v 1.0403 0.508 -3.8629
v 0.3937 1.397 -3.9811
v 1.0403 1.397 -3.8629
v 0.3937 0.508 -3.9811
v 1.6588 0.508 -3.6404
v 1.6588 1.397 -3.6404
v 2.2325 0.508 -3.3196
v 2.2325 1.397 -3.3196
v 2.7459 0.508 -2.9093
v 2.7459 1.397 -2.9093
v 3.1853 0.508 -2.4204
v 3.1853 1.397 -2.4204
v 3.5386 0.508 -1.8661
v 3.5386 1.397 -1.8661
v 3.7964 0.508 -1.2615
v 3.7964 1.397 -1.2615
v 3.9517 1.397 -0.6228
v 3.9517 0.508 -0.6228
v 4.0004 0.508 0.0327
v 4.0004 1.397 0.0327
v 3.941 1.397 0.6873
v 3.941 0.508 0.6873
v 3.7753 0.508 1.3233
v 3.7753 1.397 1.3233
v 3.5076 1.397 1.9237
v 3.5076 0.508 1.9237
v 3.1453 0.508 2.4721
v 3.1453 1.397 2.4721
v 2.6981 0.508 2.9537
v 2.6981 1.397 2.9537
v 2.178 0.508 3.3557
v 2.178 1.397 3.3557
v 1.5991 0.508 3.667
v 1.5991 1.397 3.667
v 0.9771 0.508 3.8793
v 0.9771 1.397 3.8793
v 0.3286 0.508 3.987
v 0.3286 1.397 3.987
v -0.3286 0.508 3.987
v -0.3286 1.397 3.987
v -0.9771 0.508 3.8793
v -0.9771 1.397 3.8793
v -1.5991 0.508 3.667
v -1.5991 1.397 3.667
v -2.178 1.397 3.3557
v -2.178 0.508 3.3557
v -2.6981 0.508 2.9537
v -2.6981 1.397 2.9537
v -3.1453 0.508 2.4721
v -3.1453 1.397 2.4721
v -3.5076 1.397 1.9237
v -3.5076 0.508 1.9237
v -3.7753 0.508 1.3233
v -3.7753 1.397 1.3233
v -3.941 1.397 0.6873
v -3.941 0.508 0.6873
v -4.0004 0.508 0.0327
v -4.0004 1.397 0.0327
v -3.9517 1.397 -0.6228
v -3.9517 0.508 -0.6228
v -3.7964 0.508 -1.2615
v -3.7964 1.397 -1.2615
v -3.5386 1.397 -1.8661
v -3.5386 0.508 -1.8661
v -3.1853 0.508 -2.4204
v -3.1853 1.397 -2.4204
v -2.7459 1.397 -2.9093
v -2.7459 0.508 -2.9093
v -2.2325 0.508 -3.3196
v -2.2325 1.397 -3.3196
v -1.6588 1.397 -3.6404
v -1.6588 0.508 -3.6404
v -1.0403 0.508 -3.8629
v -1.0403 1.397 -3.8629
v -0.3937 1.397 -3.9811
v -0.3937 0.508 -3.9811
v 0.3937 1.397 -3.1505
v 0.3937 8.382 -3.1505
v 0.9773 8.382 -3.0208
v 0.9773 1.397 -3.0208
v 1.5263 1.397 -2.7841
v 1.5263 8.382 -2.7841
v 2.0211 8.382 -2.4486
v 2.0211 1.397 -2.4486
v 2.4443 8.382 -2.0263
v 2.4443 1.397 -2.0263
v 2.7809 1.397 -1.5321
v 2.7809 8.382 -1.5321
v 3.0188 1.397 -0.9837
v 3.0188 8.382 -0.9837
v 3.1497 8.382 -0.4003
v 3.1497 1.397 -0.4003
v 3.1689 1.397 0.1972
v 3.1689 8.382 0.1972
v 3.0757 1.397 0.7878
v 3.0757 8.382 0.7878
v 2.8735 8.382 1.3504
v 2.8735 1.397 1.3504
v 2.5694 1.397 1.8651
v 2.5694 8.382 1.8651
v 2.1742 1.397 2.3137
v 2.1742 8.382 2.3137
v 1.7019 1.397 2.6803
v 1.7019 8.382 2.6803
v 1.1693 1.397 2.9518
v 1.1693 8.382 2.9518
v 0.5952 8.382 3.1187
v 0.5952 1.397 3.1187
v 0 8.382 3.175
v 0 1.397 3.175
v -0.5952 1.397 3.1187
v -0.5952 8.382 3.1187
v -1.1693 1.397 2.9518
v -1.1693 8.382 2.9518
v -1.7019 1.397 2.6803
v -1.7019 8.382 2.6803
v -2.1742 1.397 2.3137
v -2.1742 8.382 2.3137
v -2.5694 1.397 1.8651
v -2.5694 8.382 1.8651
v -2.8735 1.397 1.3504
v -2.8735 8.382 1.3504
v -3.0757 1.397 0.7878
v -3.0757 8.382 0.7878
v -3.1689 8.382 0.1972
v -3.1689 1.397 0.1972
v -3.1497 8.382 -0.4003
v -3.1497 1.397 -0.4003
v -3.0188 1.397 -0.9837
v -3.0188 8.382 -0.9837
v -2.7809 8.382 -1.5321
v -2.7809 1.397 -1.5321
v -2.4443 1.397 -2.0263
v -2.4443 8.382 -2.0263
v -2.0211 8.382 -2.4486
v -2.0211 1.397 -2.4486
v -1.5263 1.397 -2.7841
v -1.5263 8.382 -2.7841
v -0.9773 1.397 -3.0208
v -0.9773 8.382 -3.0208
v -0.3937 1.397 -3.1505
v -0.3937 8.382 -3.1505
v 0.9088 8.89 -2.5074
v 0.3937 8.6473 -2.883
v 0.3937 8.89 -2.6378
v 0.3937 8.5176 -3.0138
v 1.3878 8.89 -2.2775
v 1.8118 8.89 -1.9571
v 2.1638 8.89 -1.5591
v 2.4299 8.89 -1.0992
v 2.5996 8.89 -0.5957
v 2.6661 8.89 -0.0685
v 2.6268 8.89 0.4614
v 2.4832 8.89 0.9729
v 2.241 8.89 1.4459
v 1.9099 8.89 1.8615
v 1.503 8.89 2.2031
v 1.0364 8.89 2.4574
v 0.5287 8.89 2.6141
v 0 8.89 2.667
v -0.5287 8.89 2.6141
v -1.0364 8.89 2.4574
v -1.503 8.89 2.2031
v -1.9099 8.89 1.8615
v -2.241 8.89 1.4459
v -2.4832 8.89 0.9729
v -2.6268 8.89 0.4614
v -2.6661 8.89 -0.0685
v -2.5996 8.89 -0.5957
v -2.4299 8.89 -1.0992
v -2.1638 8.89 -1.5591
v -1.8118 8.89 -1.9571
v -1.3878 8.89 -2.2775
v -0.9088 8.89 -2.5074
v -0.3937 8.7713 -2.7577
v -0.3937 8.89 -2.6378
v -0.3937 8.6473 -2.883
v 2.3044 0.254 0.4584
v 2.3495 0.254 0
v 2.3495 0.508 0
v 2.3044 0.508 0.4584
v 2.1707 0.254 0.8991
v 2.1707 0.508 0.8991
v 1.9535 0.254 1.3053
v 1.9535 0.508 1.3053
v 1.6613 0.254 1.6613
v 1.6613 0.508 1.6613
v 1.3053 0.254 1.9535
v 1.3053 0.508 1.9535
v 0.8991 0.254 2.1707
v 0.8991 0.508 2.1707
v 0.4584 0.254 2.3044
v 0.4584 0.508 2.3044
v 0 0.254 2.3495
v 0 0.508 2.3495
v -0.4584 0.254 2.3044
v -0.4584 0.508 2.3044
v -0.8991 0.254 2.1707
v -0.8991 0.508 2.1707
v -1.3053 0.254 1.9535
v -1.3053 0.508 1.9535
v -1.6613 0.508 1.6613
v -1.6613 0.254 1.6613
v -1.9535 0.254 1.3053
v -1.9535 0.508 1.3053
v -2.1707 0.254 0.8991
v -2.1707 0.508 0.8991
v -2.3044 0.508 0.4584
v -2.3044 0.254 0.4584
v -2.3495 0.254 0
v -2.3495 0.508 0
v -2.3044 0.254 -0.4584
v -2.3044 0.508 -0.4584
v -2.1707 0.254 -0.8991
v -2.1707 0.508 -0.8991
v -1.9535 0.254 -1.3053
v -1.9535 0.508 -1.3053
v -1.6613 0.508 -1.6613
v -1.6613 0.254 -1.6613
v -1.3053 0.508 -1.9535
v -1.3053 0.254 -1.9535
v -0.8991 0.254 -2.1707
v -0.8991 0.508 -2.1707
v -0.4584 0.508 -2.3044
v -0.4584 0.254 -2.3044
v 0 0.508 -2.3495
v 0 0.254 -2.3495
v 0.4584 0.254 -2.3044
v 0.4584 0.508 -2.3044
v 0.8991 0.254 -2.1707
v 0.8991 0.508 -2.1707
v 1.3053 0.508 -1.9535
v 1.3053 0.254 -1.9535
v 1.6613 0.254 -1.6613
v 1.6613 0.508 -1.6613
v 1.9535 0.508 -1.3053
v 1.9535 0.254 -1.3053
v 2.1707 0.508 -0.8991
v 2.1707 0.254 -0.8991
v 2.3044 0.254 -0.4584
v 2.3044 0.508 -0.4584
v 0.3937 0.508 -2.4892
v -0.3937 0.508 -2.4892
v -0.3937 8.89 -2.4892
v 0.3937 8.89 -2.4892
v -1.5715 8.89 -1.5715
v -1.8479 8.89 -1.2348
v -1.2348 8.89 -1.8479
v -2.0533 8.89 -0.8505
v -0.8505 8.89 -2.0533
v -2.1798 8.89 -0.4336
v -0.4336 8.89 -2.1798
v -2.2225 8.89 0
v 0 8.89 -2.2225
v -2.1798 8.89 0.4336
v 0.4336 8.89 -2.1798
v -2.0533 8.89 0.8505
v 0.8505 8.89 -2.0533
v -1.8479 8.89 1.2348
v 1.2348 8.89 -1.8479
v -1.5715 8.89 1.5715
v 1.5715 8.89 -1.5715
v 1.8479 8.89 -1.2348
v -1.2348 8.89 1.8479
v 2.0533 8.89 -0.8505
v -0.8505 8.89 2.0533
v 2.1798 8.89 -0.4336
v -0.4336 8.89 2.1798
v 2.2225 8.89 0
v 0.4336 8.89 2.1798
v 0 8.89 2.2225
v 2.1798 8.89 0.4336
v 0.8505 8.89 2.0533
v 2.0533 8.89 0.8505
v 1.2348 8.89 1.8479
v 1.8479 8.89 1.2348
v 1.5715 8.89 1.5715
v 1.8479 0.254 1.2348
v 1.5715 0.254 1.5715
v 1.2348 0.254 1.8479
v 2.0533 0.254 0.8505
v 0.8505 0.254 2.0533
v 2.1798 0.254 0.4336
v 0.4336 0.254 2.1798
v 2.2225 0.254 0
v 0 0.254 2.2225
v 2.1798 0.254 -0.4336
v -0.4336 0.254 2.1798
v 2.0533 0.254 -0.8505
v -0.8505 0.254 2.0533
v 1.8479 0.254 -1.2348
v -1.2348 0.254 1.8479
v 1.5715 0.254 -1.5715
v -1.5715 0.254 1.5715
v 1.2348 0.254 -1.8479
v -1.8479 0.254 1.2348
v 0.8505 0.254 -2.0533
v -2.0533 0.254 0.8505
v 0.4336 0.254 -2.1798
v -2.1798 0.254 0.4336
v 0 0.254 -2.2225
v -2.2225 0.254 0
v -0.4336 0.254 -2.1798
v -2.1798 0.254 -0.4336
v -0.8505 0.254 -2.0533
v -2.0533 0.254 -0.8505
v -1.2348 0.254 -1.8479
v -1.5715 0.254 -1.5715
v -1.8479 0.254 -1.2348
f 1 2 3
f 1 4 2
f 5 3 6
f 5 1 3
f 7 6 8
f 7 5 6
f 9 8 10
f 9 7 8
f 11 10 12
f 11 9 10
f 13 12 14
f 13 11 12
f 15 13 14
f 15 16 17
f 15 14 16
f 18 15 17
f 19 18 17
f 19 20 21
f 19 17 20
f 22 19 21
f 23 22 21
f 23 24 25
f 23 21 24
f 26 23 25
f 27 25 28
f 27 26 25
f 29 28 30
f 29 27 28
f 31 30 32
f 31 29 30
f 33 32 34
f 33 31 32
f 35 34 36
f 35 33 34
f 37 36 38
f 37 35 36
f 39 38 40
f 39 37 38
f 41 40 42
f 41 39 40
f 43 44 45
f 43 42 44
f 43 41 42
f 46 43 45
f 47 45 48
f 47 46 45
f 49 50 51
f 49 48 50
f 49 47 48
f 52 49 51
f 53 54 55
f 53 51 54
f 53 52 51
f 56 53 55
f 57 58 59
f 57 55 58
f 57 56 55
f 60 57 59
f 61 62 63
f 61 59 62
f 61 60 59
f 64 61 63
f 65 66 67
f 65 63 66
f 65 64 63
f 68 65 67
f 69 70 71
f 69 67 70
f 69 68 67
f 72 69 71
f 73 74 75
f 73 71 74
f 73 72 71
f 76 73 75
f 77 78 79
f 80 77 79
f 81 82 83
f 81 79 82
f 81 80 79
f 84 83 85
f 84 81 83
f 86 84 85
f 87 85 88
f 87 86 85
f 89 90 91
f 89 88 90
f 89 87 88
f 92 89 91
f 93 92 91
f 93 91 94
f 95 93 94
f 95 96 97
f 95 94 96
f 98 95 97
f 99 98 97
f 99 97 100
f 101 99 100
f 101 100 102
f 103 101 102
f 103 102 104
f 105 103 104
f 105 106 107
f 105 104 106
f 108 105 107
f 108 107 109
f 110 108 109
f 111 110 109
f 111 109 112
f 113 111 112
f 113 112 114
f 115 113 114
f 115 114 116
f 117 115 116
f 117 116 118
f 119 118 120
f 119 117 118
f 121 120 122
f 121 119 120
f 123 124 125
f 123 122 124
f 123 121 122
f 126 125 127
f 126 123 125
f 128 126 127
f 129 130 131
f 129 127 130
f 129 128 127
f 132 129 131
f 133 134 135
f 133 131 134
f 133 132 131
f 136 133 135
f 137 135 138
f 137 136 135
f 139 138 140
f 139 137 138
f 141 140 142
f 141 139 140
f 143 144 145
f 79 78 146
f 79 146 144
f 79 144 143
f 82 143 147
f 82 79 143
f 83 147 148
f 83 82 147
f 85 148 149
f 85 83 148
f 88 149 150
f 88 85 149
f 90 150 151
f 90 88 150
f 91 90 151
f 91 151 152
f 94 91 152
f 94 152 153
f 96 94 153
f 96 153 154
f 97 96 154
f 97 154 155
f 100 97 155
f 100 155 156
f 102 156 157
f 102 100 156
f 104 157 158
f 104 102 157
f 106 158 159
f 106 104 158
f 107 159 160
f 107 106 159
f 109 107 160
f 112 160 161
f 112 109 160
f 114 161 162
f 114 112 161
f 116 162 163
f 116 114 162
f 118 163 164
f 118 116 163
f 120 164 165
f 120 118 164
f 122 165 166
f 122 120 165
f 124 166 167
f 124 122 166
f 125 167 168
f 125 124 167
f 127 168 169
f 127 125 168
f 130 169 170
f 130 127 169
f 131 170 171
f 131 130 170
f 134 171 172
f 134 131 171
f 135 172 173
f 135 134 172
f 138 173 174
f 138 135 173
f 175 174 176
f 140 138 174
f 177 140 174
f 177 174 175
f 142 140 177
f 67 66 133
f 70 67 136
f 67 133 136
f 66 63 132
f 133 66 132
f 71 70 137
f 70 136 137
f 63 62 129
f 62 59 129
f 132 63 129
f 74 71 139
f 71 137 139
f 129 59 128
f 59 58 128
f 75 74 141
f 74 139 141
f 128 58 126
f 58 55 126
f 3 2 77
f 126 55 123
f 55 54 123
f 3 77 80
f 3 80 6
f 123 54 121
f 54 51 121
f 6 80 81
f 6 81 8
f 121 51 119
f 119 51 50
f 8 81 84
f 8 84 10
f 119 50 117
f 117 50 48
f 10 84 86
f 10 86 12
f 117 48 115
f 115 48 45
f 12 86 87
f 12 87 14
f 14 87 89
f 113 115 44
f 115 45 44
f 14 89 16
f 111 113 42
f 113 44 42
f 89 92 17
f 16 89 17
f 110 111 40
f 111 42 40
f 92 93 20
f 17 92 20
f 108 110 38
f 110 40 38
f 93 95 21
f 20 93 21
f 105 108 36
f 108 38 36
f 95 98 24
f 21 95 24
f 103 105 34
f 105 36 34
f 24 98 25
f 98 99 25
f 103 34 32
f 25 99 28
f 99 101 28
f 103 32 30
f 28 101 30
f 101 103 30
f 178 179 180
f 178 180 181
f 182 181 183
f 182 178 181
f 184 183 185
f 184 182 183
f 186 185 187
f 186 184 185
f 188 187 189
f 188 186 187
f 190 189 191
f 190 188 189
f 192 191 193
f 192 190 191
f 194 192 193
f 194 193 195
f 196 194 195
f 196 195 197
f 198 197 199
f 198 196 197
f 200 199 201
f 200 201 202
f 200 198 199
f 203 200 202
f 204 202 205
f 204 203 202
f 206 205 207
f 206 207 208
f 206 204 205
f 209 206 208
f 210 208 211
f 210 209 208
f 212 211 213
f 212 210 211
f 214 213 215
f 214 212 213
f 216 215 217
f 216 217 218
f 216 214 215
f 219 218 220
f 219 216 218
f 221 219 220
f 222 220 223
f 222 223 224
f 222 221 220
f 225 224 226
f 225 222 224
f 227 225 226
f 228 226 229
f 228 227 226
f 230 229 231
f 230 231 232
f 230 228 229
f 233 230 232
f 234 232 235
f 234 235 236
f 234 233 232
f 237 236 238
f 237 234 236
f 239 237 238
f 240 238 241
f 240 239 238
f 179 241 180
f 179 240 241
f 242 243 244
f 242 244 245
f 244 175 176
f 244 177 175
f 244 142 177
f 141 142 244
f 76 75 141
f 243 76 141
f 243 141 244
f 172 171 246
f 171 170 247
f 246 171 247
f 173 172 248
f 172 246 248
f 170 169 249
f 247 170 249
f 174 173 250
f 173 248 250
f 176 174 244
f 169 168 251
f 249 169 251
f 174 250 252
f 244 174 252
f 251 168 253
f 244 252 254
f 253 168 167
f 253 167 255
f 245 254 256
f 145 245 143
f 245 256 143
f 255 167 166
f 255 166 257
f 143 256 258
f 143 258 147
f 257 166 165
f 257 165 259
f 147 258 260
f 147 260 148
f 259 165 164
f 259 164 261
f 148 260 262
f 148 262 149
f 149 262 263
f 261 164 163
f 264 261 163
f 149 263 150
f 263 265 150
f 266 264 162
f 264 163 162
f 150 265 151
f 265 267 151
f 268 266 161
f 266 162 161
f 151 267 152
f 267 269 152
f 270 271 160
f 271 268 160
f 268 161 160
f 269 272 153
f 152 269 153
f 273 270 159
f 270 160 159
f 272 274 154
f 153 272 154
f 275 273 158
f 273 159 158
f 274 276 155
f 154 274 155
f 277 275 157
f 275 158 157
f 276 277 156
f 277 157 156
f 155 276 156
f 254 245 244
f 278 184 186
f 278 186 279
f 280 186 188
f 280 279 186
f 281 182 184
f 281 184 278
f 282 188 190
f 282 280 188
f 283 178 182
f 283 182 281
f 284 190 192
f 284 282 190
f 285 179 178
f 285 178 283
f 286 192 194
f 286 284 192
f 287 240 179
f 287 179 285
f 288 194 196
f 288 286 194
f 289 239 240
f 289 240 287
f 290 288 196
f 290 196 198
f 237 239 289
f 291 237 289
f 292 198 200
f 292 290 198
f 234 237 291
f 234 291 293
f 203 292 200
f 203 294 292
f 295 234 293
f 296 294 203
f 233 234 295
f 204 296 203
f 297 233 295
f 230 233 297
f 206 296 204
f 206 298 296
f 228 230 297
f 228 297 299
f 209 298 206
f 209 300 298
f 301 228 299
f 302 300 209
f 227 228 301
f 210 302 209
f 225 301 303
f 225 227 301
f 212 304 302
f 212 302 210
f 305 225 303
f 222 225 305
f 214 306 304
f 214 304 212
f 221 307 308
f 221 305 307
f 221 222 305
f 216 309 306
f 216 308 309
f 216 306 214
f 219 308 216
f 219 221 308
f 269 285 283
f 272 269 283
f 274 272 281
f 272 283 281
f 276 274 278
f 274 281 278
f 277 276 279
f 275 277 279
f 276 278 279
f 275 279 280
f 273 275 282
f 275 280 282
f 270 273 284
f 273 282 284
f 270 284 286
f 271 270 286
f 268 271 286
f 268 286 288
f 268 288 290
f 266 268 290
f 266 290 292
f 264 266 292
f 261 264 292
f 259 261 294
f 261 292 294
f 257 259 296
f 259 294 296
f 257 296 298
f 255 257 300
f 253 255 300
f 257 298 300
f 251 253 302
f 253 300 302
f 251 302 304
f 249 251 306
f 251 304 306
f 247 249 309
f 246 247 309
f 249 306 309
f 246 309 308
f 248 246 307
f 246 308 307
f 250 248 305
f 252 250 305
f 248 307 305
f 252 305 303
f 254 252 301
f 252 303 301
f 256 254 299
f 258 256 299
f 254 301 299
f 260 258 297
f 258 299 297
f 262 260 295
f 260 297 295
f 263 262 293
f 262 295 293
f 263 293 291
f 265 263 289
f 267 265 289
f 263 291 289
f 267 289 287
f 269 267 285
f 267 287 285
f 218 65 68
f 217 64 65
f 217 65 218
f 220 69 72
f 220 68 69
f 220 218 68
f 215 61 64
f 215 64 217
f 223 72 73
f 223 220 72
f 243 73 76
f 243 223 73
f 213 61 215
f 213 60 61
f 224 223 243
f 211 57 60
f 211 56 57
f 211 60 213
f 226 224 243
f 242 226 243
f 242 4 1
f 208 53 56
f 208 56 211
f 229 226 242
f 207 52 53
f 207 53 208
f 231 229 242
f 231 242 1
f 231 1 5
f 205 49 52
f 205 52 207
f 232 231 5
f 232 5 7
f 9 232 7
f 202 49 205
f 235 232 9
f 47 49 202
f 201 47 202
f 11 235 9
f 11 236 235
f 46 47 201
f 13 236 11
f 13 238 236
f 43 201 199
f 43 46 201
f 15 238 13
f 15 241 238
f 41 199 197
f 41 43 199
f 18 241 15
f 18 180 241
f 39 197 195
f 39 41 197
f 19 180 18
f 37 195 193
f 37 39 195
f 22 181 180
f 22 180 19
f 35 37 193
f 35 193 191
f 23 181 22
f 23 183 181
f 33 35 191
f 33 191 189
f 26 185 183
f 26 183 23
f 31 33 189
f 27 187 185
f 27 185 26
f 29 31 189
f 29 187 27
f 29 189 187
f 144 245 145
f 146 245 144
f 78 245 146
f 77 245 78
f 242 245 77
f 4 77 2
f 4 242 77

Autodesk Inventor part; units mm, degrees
sketch "Sketch_1" plane through (0, 0, 0) normal (0, 0, 1) x (1, 0, 0)
  line L0 (-6.35, 0) -> (6.35, 0)
  arc A0 (6.35, 0) -> (6.096, 0.254) centre (6.096, 0) ccw
  line L1 (6.096, 0.254) -> (-6.096, 0.254)
  arc A1 (-6.096, 0.254) -> (-6.35, 0) centre (-6.096, 0) ccw
extrude "Extrusion1" add sketch "Sketch_1" along normal mid plane 13.0048
sketch "Sketch_6" plane through (0, 0, 0) normal (0, 0, 1) x (1, 0, 0)
  line L0 (0, 0.127) -> (0, 8.89)
  line L1 (0, 8.89) -> (2.667, 8.89)
  line L2 (2.667, 8.89) -> (3.175, 8.382)
  line L3 (3.175, 8.382) -> (3.175, 1.397)
  line L4 (3.175, 1.397) -> (4.0005, 1.397)
  line L5 (4.0005, 1.397) -> (4.0005, 0.508)
  line L6 (4.0005, 0.508) -> (2.3495, 0.508)
  line L7 (2.3495, 0.508) -> (2.3495, 0.127)
  line L8 (2.3495, 0.127) -> (0, 0.127)
  line L9 (0, 0.127) -> (0, 8.89)
revolve "Revolution1" add sketch "Sketch_6" angle 360 about axis through (0, 0.127, 0) along (0, -1, 0)
thread "Thread1" size "1/4-32 UNEF" class "3A" standard "ANSI Unified Screw Threads" length 6.5852 offset 0.3998
sketch "Sketch_8" plane through (0, 0.254, 0) normal (0, 1, 0) x (1, 0, 0)
  line L0 (-0.3937, 2.4892) -> (0.3937, 2.4892)
  line L1 (0.3937, 2.4892) -> (0.3937, 10.4902)
  line L2 (0.3937, 10.4902) -> (-0.3937, 10.4902)
  line L3 (-0.3937, 10.4902) -> (-0.3937, 2.4892)
extrude "Extrusion2" cut sketch "Sketch_8" along normal blind 9.779
sketch "Sketch_10_ALT_Drilling_1" plane through (0, 0, 0) normal (0, 0, 1) x (1, 0, 0)
  line L0 (0, 0) -> (0, 9.525)
  line L1 (0, 9.525) -> (2.2225, 9.525)
  line L2 (2.2225, 9.525) -> (2.2225, 0)
  line L3 (2.2225, 0) -> (0, 0)
  line L4 (0, 0) -> (0, 9.525)
revolve "Revolution2" cut sketch "Sketch_10_ALT_Drilling_1" angle 360 about axis through (0, 0, 0) along (0, -1, 0)
sketch "Sketch_2" plane through (0, 0, 0) normal (0, 0, 1) x (1, 0, 0)
  line L0 (-6.35, 0.254) -> (-6.35, 0)
  line L1 (-6.35, 0) -> (6.35, 0)
  line L2 (6.35, 0) -> (6.35, 0.254)
  line L3 (6.35, 0.254) -> (-6.35, 0.254)
extrude "Extrusion3" cut sketch "Sketch_2" along normal mid plane 13.0048
ref_plane "1_XY" through (0, 7.112, 0) normal (0, 1, 0) x (1, 0, 0)
ref_plane "1_YZ" through (0, 7.112, 0) normal (1, 0, 0) x (0, 0, -1)
ref_plane "1_ZX" through (0, 7.112, 0) normal (0, 0, -1) x (0, 1, 0)
ref_plane "2_XY" through (0, 5.334, 0) normal (0, 1, 0) x (1, 0, 0)
ref_plane "2_YZ" through (0, 5.334, 0) normal (1, 0, 0) x (0, 0, -1)
ref_plane "2_ZX" through (0, 5.334, 0) normal (0, 0, -1) x (0, 1, 0)
ref_plane "3_XY" through (0, 3.556, 0) normal (0, 1, 0) x (1, 0, 0)
ref_plane "3_YZ" through (0, 3.556, 0) normal (1, 0, 0) x (0, 0, -1)
ref_plane "3_ZX" through (0, 3.556, 0) normal (0, 0, -1) x (0, 1, 0)
ref_plane "4_XY" through (0, 2.2225, 0) normal (0, 1, 0) x (1, 0, 0)
ref_plane "4_YZ" through (0, 2.2225, 0) normal (1, 0, 0) x (0, 0, -1)
ref_plane "4_ZX" through (0, 2.2225, 0) normal (0, 0, -1) x (0, 1, 0)
ref_plane "to_base_XY" through (0, 0, 0) normal (0, 1, 0) x (1, 0, 0)
ref_plane "to_base_YZ" through (0, 0, 0) normal (1, 0, 0) x (0, 0, -1)
ref_plane "to_base_ZX" through (0, 0, 0) normal (0, 0, -1) x (0, 1, 0)
properties part number "M20ANG2S1M202BR-bushing"
